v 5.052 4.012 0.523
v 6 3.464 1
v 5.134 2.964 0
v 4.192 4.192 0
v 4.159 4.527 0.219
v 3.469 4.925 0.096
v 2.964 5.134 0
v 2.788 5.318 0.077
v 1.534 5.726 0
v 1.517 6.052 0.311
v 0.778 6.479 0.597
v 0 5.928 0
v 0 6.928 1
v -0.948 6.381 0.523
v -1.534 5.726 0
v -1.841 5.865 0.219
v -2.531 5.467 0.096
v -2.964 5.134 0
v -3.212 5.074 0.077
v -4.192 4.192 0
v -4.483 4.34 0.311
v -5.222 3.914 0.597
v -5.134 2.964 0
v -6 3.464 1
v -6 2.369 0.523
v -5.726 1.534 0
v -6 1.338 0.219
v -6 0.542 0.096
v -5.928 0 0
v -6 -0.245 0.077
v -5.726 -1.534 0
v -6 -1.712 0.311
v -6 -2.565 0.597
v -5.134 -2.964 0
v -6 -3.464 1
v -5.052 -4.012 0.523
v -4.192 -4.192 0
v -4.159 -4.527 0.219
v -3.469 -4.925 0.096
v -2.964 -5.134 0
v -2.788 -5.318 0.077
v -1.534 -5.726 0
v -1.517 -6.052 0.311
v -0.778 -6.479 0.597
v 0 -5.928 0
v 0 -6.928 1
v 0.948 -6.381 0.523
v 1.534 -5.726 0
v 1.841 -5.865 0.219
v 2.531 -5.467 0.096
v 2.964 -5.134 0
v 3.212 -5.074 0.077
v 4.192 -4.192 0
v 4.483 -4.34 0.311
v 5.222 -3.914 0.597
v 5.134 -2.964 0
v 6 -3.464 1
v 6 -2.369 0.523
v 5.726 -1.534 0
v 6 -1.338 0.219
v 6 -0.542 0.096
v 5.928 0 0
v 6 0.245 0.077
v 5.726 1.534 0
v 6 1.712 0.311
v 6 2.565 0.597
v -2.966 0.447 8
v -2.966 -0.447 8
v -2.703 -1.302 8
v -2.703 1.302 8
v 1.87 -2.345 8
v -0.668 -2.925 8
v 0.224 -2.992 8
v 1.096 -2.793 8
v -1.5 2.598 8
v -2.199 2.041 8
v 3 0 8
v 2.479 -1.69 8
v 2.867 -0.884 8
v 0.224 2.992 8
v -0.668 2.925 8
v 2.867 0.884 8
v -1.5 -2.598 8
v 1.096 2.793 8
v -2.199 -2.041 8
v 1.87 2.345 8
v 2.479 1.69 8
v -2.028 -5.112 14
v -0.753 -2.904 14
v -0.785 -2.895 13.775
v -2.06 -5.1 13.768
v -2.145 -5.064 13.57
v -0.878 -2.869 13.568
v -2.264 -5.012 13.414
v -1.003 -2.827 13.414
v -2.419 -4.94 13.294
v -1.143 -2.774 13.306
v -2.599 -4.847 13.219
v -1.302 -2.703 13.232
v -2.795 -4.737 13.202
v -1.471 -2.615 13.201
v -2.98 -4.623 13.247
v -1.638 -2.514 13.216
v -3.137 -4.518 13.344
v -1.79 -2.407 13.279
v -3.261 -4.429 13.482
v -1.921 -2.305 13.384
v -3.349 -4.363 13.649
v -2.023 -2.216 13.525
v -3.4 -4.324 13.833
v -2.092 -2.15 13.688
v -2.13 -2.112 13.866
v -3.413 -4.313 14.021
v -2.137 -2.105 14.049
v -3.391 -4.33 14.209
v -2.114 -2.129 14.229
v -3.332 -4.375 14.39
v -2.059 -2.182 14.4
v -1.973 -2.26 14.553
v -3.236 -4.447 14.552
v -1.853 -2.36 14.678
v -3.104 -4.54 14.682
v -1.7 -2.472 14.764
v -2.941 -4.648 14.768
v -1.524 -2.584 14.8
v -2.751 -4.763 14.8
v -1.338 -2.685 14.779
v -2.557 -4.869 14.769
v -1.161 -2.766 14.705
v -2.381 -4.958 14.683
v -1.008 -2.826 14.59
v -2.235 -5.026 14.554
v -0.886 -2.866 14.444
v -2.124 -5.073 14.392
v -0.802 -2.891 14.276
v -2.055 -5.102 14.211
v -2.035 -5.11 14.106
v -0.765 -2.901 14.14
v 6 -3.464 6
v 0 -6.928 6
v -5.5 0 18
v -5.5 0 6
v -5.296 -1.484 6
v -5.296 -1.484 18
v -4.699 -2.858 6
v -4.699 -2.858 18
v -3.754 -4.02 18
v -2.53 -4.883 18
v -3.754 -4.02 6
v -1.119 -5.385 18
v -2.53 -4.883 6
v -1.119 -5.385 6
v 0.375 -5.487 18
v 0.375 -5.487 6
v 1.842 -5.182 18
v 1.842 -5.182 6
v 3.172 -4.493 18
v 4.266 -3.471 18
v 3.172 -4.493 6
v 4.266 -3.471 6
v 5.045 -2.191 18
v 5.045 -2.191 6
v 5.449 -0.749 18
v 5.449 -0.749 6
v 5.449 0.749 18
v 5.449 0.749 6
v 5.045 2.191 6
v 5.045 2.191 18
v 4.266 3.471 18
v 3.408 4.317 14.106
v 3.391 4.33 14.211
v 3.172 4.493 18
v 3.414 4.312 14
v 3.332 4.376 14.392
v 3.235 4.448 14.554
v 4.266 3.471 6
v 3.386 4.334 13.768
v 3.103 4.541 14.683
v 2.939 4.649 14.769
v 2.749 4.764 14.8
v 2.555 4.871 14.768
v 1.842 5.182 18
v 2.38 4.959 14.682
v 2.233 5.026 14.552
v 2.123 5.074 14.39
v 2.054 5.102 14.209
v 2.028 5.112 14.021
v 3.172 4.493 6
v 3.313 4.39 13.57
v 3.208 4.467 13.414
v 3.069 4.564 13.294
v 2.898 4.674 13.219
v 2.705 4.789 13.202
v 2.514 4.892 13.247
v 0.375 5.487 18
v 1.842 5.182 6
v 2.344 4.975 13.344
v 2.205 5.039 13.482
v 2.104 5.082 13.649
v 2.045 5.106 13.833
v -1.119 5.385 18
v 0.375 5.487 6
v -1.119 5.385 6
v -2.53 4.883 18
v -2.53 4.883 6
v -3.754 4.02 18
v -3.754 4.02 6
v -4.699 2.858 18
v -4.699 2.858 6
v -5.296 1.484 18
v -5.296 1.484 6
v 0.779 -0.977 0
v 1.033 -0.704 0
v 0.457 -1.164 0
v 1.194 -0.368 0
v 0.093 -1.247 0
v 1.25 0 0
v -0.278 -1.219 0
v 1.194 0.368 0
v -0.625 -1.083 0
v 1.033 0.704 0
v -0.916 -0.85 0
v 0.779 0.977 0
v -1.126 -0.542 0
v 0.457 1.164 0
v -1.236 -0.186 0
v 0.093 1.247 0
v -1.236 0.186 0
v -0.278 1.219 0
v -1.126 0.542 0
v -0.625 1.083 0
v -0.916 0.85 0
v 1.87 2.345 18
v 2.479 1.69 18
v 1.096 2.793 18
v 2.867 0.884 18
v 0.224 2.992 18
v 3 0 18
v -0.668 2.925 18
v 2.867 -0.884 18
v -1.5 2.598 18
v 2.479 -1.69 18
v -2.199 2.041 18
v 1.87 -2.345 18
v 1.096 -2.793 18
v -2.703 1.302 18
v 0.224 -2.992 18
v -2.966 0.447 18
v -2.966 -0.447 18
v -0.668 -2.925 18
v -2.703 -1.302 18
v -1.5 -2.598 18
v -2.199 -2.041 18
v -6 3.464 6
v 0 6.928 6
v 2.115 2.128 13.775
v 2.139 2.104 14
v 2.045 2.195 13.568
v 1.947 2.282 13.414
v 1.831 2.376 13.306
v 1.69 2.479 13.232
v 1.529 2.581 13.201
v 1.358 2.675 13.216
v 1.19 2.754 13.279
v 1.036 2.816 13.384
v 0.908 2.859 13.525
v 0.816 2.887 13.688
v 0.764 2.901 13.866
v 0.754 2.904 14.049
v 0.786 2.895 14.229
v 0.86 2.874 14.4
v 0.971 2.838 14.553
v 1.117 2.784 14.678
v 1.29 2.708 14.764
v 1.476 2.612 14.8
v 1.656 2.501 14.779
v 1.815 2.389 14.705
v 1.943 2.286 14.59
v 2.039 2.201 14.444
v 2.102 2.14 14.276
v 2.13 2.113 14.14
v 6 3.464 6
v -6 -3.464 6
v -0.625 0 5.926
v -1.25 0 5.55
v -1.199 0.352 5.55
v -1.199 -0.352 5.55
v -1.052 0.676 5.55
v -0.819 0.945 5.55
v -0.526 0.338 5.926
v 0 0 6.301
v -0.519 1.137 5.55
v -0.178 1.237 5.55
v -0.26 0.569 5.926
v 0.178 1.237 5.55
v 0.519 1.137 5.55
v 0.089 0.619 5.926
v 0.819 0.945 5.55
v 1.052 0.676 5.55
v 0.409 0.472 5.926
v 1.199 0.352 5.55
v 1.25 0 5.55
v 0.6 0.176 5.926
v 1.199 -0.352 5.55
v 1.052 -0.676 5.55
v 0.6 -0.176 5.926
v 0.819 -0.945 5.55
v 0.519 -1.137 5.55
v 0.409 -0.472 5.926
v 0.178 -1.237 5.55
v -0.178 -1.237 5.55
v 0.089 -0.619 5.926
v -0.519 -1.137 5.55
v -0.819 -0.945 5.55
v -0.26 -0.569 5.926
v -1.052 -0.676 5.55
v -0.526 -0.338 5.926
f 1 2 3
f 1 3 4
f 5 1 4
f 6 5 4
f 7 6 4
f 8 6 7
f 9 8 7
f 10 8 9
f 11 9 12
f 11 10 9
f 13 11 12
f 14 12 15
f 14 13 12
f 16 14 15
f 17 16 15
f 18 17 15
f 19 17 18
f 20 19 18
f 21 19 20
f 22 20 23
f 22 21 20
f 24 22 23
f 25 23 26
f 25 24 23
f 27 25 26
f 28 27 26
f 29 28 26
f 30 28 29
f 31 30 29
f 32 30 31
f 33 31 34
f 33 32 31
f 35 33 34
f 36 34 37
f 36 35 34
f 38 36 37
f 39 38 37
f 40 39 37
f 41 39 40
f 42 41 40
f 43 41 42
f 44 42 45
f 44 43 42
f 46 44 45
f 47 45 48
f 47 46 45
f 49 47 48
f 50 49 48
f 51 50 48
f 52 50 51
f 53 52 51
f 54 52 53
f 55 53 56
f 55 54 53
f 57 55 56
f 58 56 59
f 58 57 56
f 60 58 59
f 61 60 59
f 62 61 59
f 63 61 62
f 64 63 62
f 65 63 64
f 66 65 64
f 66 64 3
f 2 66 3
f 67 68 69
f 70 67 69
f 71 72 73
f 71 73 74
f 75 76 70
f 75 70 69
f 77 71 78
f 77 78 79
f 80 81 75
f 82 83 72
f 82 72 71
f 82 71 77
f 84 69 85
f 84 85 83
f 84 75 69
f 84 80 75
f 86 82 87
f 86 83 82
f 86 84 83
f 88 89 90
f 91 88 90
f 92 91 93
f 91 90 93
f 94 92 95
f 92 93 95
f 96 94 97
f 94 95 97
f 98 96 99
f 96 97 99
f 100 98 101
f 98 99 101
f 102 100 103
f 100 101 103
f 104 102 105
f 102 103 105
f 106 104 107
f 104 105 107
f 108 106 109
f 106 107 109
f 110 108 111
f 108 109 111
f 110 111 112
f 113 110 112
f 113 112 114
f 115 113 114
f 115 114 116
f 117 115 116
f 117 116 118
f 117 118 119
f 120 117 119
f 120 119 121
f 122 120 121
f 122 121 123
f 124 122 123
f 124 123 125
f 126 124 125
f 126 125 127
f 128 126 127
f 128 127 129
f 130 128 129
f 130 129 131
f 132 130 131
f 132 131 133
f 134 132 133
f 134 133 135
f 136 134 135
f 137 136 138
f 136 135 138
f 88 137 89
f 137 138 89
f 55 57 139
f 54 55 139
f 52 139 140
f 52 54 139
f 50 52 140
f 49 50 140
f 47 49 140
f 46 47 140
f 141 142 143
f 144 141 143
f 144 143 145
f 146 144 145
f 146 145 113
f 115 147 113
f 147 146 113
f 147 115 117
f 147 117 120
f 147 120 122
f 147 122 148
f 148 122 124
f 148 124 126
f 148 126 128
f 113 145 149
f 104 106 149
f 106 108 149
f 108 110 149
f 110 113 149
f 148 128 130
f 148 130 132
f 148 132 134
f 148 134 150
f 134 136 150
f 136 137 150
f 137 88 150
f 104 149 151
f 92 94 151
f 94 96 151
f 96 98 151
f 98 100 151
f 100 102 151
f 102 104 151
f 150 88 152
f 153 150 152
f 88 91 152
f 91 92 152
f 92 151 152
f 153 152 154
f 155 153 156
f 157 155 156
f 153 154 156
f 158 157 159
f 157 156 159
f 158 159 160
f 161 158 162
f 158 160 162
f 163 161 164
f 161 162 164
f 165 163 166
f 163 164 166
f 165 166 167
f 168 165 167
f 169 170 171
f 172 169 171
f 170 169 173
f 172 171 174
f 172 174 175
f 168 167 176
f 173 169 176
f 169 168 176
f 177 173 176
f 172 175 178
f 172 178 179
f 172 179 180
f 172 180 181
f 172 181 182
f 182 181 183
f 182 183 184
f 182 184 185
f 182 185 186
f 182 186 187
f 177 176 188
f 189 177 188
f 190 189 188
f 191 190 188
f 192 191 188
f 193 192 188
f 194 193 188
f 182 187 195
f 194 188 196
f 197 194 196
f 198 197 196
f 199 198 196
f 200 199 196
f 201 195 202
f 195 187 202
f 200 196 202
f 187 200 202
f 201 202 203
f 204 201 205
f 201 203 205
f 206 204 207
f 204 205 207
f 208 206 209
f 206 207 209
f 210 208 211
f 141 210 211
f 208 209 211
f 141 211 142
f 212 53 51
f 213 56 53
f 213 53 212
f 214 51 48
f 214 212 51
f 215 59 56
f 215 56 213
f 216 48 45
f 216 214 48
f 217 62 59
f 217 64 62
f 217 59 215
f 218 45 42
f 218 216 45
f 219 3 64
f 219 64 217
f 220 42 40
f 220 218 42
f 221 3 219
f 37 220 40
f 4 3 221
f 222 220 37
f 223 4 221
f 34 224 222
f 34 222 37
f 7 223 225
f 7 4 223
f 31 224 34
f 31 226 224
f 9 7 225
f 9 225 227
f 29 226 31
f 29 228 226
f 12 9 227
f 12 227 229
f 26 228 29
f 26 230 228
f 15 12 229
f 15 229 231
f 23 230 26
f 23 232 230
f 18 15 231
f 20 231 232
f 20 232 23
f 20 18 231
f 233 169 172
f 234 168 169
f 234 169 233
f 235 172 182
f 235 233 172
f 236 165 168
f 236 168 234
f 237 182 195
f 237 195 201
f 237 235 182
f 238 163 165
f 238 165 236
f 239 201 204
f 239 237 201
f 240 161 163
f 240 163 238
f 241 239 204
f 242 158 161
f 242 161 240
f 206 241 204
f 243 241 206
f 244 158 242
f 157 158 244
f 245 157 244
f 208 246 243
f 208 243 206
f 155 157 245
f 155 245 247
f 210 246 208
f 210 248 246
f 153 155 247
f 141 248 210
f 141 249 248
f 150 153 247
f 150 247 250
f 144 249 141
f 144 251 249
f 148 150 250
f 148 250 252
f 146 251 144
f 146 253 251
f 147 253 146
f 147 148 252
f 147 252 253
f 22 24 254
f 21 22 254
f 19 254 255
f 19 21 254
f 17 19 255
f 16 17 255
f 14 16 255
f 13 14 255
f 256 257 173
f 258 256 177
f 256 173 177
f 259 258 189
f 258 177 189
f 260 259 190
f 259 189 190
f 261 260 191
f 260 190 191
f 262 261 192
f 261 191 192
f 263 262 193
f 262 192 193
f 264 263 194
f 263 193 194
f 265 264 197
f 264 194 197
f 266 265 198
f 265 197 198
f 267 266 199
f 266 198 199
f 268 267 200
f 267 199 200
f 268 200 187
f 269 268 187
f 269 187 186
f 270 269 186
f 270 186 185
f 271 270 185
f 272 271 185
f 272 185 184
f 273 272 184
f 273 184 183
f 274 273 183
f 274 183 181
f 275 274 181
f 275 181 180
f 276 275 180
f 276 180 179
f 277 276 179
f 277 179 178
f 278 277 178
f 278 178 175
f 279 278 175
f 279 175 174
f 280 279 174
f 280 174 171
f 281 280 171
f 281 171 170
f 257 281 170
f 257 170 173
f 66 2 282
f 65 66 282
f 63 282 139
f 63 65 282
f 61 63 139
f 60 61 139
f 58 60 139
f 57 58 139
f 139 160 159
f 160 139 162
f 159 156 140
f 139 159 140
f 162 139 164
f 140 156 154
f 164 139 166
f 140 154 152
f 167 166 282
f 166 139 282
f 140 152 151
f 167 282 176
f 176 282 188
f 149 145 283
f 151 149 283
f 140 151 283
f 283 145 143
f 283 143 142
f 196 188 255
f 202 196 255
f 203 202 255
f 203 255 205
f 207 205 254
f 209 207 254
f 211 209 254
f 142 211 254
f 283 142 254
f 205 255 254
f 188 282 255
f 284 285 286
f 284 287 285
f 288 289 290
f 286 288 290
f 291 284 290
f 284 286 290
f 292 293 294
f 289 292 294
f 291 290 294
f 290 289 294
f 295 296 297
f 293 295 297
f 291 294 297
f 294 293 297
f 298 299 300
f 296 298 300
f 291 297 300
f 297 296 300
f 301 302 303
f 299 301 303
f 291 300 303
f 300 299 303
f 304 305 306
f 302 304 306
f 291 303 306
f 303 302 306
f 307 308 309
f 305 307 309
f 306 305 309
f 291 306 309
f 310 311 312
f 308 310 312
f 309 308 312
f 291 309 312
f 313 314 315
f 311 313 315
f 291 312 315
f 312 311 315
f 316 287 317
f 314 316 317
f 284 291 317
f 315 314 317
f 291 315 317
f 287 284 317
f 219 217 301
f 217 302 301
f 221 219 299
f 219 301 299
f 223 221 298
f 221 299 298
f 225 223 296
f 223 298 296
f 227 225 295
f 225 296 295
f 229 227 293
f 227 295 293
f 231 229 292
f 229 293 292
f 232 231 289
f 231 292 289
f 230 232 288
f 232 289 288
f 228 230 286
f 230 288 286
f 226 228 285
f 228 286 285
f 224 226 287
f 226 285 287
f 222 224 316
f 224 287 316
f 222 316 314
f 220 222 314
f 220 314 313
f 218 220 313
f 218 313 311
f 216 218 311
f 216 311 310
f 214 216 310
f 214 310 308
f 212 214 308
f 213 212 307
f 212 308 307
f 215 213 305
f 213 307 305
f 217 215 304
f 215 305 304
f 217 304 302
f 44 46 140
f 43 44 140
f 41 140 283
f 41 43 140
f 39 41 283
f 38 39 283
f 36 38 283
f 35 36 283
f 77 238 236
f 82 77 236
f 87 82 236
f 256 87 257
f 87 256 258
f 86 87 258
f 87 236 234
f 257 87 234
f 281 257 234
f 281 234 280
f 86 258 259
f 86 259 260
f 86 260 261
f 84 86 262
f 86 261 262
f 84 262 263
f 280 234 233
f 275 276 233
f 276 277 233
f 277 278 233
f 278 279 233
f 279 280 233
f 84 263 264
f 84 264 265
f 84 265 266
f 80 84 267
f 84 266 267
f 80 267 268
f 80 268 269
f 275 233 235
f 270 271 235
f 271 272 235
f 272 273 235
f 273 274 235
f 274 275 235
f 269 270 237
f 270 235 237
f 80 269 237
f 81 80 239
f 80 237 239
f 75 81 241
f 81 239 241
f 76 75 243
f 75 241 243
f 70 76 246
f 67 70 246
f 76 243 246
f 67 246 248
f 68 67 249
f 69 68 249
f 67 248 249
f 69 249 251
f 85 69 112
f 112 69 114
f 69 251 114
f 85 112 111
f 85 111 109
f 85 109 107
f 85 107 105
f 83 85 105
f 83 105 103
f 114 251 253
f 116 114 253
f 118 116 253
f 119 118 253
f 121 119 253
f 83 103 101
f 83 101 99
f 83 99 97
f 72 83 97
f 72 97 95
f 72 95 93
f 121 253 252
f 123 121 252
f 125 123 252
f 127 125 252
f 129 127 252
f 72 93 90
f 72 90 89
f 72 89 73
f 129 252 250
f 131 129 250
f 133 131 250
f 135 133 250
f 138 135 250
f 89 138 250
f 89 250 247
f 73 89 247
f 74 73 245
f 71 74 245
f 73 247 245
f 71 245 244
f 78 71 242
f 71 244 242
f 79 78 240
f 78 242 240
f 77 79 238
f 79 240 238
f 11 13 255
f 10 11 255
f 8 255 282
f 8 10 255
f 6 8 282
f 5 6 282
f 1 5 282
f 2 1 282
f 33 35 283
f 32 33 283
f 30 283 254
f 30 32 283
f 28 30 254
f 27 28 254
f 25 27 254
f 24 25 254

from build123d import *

# Parameters (mm, degrees)
EXTRUDE_1_DEPTH        = 6
SKETCH_2_R             = 5.5
EXTRUDE_2_DEPTH        = 12
HOLE_WIZARD_M3_1_D     = 2.5
HOLE_WIZARD_M3_1_DEPTH = 5.55
HOLE_WIZARD_M3_1_TIP   = 0.751075774
HOLE_WIZARD_M2_2_D     = 1.6
SKETCH_11_R            = 3
CUT_EXTRUDE_1_DEPTH    = 10


with BuildPart() as part:
    # 草图1 → 凸台-拉伸1 (new body)
    with BuildSketch(Plane.XY):
        Polygon((-6, 3.464101615), (0, 6.92820323), (6, 3.464101615), (6, -3.464101615), (0, -6.92820323), (-6, -3.464101615), align=None)
    extrude(amount=EXTRUDE_1_DEPTH)

    # 草图2 → 凸台-拉伸2 (add)
    with BuildSketch(Plane.XY.offset(6)):
        with Locations(Location((0, 0, 0), (0, 0, 180))):
            Circle(SKETCH_2_R)
    extrude(amount=EXTRUDE_2_DEPTH)

    # M3 螺纹孔1
    with Locations(Plane(origin=(0, 0, 0), x_dir=(-1, 0, 0), z_dir=(0, 0, -1))):
        with Locations((0, 0)):
            Hole(HOLE_WIZARD_M3_1_D / 2, depth=HOLE_WIZARD_M3_1_DEPTH)
            with Locations((0, 0, -(HOLE_WIZARD_M3_1_DEPTH + HOLE_WIZARD_M3_1_TIP / 2))):  # 118° drill point
                Cone(0, HOLE_WIZARD_M3_1_D / 2, HOLE_WIZARD_M3_1_TIP, mode=Mode.SUBTRACT)

    # M2 螺纹孔2 (through all)
    with Locations(Plane(origin=(-2.75, -4.763139721, 0), x_dir=(-0.866025403784438, 0.5000000000000011, 0), z_dir=(-0.5000000000000011, -0.8660254037844382, 0))):
        with Locations((0, -14)):
            Hole(HOLE_WIZARD_M2_2_D / 2)

    # 草图10 → 切除-旋转3 (revolve, cut)
    with BuildSketch(Plane(origin=(0, 0, 0), x_dir=(-0.866025403784438, 0.5000000000000011, 0), z_dir=(-0.5000000000000011, -0.8660254037844382, 0)), mode=Mode.PRIVATE) as cut_revolve_3_sk:
        Polygon((6.92820323, 0), (5.92820323, 0), (6.92820323, -1), align=None)
    revolve(cut_revolve_3_sk.sketch.rotate(Axis((0, 0, 0), (0, 0, 1)), 240.000000079), axis=Axis((0, 0, 0), (0, 0, 1)), mode=Mode.SUBTRACT)

    # 草图11 → 切除-拉伸1 (cut)
    with BuildSketch(Plane.XY.offset(18)):
        Circle(SKETCH_11_R)
    extrude(amount=-CUT_EXTRUDE_1_DEPTH, mode=Mode.SUBTRACT)


solid = part.part
